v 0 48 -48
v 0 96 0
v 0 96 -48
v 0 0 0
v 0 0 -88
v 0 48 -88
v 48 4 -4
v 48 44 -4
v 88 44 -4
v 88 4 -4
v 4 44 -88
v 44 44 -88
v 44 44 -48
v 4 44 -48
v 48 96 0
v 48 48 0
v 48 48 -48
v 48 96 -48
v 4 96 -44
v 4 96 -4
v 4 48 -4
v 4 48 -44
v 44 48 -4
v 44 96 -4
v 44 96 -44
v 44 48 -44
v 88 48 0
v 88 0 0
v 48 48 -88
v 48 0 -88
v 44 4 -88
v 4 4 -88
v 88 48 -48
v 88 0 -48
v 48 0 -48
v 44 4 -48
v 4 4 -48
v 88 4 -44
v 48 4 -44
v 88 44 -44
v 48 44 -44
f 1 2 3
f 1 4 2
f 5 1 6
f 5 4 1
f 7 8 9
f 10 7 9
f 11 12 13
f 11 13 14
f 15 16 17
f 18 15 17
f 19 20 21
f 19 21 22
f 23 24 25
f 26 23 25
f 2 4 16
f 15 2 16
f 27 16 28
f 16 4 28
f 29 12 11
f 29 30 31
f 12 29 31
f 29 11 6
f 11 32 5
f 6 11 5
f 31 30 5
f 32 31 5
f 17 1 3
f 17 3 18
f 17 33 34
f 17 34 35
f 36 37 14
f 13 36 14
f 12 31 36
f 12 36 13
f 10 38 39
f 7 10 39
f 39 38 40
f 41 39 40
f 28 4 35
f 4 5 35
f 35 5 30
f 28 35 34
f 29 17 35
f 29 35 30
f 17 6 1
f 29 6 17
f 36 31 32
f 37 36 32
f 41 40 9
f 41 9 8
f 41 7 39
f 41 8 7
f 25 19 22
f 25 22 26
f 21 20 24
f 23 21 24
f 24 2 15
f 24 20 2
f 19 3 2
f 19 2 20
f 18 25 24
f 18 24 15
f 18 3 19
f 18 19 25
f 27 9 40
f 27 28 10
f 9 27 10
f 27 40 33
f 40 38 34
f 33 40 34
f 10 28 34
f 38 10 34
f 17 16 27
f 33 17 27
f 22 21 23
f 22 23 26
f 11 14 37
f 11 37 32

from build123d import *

# Parameters (mm, degrees)
EXTRUDE_1_DEPTH     = 48
SKETCH_2_W          = 48
SKETCH_2_H          = 48
EXTRUDE_2_DEPTH     = 48
SKETCH_3_W          = 40
SKETCH_3_H          = 40
CUT_EXTRUDE_1_DEPTH = 84
SKETCH_4_W          = 40
SKETCH_4_H          = 40
CUT_EXTRUDE_2_DEPTH = 84
SKETCH_5_W          = 40
SKETCH_5_H          = 40
CUT_EXTRUDE_3_DEPTH = 84
SKETCH_6_W          = 48
SKETCH_6_H          = 48
EXTRUDE_5_DEPTH     = 44


with BuildPart() as part:
    # 草图1 → 凸台-拉伸1 (new body)
    with BuildSketch(Plane(origin=(0, 0, 0), x_dir=(1, 0, 0), z_dir=(0, 1, 0))):
        Polygon((0, 88), (0, 0), (88, 0), (88, 48), (48, 48), (48, 88), align=None)
    extrude(amount=EXTRUDE_1_DEPTH)

    # 草图2 → 凸台-拉伸2 (add)
    with BuildSketch(Plane(origin=(0, 48, 0), x_dir=(1, 0, 0), z_dir=(0, 1, 0))):
        with Locations((24, 24)):
            Rectangle(SKETCH_2_W, SKETCH_2_H)
    extrude(amount=EXTRUDE_2_DEPTH)

    # 草图3 → 切除-拉伸1 (cut)
    with BuildSketch(Plane(origin=(88, 0, 0), x_dir=(0, 0, -1), z_dir=(1, 0, 0))):
        with Locations((24, 24)):
            Rectangle(SKETCH_3_W, SKETCH_3_H)
    extrude(amount=-CUT_EXTRUDE_1_DEPTH, mode=Mode.SUBTRACT)

    # 草图4 → 切除-拉伸2 (cut)
    with BuildSketch(Plane(origin=(0, 0, -88), x_dir=(-1, 0, 0), z_dir=(0, 0, -1))):
        with Locations((-24, 24)):
            Rectangle(SKETCH_4_W, SKETCH_4_H)
    extrude(amount=-CUT_EXTRUDE_2_DEPTH, mode=Mode.SUBTRACT)

    # 草图5 → 切除-拉伸3 (cut)
    with BuildSketch(Plane(origin=(0, 96, 0), x_dir=(1, 0, 0), z_dir=(0, 1, 0))):
        with Locations((24, 24)):
            Rectangle(SKETCH_5_W, SKETCH_5_H)
    extrude(amount=-CUT_EXTRUDE_3_DEPTH, mode=Mode.SUBTRACT)

    # 草图6 → 凸台-拉伸5 (add)
    with BuildSketch(Plane(origin=(4, 0, 0), x_dir=(0, 0, -1), z_dir=(1, 0, 0))):
        with Locations((24, 24)):
            Rectangle(SKETCH_6_W, SKETCH_6_H)
    extrude(amount=EXTRUDE_5_DEPTH)


solid = part.part
